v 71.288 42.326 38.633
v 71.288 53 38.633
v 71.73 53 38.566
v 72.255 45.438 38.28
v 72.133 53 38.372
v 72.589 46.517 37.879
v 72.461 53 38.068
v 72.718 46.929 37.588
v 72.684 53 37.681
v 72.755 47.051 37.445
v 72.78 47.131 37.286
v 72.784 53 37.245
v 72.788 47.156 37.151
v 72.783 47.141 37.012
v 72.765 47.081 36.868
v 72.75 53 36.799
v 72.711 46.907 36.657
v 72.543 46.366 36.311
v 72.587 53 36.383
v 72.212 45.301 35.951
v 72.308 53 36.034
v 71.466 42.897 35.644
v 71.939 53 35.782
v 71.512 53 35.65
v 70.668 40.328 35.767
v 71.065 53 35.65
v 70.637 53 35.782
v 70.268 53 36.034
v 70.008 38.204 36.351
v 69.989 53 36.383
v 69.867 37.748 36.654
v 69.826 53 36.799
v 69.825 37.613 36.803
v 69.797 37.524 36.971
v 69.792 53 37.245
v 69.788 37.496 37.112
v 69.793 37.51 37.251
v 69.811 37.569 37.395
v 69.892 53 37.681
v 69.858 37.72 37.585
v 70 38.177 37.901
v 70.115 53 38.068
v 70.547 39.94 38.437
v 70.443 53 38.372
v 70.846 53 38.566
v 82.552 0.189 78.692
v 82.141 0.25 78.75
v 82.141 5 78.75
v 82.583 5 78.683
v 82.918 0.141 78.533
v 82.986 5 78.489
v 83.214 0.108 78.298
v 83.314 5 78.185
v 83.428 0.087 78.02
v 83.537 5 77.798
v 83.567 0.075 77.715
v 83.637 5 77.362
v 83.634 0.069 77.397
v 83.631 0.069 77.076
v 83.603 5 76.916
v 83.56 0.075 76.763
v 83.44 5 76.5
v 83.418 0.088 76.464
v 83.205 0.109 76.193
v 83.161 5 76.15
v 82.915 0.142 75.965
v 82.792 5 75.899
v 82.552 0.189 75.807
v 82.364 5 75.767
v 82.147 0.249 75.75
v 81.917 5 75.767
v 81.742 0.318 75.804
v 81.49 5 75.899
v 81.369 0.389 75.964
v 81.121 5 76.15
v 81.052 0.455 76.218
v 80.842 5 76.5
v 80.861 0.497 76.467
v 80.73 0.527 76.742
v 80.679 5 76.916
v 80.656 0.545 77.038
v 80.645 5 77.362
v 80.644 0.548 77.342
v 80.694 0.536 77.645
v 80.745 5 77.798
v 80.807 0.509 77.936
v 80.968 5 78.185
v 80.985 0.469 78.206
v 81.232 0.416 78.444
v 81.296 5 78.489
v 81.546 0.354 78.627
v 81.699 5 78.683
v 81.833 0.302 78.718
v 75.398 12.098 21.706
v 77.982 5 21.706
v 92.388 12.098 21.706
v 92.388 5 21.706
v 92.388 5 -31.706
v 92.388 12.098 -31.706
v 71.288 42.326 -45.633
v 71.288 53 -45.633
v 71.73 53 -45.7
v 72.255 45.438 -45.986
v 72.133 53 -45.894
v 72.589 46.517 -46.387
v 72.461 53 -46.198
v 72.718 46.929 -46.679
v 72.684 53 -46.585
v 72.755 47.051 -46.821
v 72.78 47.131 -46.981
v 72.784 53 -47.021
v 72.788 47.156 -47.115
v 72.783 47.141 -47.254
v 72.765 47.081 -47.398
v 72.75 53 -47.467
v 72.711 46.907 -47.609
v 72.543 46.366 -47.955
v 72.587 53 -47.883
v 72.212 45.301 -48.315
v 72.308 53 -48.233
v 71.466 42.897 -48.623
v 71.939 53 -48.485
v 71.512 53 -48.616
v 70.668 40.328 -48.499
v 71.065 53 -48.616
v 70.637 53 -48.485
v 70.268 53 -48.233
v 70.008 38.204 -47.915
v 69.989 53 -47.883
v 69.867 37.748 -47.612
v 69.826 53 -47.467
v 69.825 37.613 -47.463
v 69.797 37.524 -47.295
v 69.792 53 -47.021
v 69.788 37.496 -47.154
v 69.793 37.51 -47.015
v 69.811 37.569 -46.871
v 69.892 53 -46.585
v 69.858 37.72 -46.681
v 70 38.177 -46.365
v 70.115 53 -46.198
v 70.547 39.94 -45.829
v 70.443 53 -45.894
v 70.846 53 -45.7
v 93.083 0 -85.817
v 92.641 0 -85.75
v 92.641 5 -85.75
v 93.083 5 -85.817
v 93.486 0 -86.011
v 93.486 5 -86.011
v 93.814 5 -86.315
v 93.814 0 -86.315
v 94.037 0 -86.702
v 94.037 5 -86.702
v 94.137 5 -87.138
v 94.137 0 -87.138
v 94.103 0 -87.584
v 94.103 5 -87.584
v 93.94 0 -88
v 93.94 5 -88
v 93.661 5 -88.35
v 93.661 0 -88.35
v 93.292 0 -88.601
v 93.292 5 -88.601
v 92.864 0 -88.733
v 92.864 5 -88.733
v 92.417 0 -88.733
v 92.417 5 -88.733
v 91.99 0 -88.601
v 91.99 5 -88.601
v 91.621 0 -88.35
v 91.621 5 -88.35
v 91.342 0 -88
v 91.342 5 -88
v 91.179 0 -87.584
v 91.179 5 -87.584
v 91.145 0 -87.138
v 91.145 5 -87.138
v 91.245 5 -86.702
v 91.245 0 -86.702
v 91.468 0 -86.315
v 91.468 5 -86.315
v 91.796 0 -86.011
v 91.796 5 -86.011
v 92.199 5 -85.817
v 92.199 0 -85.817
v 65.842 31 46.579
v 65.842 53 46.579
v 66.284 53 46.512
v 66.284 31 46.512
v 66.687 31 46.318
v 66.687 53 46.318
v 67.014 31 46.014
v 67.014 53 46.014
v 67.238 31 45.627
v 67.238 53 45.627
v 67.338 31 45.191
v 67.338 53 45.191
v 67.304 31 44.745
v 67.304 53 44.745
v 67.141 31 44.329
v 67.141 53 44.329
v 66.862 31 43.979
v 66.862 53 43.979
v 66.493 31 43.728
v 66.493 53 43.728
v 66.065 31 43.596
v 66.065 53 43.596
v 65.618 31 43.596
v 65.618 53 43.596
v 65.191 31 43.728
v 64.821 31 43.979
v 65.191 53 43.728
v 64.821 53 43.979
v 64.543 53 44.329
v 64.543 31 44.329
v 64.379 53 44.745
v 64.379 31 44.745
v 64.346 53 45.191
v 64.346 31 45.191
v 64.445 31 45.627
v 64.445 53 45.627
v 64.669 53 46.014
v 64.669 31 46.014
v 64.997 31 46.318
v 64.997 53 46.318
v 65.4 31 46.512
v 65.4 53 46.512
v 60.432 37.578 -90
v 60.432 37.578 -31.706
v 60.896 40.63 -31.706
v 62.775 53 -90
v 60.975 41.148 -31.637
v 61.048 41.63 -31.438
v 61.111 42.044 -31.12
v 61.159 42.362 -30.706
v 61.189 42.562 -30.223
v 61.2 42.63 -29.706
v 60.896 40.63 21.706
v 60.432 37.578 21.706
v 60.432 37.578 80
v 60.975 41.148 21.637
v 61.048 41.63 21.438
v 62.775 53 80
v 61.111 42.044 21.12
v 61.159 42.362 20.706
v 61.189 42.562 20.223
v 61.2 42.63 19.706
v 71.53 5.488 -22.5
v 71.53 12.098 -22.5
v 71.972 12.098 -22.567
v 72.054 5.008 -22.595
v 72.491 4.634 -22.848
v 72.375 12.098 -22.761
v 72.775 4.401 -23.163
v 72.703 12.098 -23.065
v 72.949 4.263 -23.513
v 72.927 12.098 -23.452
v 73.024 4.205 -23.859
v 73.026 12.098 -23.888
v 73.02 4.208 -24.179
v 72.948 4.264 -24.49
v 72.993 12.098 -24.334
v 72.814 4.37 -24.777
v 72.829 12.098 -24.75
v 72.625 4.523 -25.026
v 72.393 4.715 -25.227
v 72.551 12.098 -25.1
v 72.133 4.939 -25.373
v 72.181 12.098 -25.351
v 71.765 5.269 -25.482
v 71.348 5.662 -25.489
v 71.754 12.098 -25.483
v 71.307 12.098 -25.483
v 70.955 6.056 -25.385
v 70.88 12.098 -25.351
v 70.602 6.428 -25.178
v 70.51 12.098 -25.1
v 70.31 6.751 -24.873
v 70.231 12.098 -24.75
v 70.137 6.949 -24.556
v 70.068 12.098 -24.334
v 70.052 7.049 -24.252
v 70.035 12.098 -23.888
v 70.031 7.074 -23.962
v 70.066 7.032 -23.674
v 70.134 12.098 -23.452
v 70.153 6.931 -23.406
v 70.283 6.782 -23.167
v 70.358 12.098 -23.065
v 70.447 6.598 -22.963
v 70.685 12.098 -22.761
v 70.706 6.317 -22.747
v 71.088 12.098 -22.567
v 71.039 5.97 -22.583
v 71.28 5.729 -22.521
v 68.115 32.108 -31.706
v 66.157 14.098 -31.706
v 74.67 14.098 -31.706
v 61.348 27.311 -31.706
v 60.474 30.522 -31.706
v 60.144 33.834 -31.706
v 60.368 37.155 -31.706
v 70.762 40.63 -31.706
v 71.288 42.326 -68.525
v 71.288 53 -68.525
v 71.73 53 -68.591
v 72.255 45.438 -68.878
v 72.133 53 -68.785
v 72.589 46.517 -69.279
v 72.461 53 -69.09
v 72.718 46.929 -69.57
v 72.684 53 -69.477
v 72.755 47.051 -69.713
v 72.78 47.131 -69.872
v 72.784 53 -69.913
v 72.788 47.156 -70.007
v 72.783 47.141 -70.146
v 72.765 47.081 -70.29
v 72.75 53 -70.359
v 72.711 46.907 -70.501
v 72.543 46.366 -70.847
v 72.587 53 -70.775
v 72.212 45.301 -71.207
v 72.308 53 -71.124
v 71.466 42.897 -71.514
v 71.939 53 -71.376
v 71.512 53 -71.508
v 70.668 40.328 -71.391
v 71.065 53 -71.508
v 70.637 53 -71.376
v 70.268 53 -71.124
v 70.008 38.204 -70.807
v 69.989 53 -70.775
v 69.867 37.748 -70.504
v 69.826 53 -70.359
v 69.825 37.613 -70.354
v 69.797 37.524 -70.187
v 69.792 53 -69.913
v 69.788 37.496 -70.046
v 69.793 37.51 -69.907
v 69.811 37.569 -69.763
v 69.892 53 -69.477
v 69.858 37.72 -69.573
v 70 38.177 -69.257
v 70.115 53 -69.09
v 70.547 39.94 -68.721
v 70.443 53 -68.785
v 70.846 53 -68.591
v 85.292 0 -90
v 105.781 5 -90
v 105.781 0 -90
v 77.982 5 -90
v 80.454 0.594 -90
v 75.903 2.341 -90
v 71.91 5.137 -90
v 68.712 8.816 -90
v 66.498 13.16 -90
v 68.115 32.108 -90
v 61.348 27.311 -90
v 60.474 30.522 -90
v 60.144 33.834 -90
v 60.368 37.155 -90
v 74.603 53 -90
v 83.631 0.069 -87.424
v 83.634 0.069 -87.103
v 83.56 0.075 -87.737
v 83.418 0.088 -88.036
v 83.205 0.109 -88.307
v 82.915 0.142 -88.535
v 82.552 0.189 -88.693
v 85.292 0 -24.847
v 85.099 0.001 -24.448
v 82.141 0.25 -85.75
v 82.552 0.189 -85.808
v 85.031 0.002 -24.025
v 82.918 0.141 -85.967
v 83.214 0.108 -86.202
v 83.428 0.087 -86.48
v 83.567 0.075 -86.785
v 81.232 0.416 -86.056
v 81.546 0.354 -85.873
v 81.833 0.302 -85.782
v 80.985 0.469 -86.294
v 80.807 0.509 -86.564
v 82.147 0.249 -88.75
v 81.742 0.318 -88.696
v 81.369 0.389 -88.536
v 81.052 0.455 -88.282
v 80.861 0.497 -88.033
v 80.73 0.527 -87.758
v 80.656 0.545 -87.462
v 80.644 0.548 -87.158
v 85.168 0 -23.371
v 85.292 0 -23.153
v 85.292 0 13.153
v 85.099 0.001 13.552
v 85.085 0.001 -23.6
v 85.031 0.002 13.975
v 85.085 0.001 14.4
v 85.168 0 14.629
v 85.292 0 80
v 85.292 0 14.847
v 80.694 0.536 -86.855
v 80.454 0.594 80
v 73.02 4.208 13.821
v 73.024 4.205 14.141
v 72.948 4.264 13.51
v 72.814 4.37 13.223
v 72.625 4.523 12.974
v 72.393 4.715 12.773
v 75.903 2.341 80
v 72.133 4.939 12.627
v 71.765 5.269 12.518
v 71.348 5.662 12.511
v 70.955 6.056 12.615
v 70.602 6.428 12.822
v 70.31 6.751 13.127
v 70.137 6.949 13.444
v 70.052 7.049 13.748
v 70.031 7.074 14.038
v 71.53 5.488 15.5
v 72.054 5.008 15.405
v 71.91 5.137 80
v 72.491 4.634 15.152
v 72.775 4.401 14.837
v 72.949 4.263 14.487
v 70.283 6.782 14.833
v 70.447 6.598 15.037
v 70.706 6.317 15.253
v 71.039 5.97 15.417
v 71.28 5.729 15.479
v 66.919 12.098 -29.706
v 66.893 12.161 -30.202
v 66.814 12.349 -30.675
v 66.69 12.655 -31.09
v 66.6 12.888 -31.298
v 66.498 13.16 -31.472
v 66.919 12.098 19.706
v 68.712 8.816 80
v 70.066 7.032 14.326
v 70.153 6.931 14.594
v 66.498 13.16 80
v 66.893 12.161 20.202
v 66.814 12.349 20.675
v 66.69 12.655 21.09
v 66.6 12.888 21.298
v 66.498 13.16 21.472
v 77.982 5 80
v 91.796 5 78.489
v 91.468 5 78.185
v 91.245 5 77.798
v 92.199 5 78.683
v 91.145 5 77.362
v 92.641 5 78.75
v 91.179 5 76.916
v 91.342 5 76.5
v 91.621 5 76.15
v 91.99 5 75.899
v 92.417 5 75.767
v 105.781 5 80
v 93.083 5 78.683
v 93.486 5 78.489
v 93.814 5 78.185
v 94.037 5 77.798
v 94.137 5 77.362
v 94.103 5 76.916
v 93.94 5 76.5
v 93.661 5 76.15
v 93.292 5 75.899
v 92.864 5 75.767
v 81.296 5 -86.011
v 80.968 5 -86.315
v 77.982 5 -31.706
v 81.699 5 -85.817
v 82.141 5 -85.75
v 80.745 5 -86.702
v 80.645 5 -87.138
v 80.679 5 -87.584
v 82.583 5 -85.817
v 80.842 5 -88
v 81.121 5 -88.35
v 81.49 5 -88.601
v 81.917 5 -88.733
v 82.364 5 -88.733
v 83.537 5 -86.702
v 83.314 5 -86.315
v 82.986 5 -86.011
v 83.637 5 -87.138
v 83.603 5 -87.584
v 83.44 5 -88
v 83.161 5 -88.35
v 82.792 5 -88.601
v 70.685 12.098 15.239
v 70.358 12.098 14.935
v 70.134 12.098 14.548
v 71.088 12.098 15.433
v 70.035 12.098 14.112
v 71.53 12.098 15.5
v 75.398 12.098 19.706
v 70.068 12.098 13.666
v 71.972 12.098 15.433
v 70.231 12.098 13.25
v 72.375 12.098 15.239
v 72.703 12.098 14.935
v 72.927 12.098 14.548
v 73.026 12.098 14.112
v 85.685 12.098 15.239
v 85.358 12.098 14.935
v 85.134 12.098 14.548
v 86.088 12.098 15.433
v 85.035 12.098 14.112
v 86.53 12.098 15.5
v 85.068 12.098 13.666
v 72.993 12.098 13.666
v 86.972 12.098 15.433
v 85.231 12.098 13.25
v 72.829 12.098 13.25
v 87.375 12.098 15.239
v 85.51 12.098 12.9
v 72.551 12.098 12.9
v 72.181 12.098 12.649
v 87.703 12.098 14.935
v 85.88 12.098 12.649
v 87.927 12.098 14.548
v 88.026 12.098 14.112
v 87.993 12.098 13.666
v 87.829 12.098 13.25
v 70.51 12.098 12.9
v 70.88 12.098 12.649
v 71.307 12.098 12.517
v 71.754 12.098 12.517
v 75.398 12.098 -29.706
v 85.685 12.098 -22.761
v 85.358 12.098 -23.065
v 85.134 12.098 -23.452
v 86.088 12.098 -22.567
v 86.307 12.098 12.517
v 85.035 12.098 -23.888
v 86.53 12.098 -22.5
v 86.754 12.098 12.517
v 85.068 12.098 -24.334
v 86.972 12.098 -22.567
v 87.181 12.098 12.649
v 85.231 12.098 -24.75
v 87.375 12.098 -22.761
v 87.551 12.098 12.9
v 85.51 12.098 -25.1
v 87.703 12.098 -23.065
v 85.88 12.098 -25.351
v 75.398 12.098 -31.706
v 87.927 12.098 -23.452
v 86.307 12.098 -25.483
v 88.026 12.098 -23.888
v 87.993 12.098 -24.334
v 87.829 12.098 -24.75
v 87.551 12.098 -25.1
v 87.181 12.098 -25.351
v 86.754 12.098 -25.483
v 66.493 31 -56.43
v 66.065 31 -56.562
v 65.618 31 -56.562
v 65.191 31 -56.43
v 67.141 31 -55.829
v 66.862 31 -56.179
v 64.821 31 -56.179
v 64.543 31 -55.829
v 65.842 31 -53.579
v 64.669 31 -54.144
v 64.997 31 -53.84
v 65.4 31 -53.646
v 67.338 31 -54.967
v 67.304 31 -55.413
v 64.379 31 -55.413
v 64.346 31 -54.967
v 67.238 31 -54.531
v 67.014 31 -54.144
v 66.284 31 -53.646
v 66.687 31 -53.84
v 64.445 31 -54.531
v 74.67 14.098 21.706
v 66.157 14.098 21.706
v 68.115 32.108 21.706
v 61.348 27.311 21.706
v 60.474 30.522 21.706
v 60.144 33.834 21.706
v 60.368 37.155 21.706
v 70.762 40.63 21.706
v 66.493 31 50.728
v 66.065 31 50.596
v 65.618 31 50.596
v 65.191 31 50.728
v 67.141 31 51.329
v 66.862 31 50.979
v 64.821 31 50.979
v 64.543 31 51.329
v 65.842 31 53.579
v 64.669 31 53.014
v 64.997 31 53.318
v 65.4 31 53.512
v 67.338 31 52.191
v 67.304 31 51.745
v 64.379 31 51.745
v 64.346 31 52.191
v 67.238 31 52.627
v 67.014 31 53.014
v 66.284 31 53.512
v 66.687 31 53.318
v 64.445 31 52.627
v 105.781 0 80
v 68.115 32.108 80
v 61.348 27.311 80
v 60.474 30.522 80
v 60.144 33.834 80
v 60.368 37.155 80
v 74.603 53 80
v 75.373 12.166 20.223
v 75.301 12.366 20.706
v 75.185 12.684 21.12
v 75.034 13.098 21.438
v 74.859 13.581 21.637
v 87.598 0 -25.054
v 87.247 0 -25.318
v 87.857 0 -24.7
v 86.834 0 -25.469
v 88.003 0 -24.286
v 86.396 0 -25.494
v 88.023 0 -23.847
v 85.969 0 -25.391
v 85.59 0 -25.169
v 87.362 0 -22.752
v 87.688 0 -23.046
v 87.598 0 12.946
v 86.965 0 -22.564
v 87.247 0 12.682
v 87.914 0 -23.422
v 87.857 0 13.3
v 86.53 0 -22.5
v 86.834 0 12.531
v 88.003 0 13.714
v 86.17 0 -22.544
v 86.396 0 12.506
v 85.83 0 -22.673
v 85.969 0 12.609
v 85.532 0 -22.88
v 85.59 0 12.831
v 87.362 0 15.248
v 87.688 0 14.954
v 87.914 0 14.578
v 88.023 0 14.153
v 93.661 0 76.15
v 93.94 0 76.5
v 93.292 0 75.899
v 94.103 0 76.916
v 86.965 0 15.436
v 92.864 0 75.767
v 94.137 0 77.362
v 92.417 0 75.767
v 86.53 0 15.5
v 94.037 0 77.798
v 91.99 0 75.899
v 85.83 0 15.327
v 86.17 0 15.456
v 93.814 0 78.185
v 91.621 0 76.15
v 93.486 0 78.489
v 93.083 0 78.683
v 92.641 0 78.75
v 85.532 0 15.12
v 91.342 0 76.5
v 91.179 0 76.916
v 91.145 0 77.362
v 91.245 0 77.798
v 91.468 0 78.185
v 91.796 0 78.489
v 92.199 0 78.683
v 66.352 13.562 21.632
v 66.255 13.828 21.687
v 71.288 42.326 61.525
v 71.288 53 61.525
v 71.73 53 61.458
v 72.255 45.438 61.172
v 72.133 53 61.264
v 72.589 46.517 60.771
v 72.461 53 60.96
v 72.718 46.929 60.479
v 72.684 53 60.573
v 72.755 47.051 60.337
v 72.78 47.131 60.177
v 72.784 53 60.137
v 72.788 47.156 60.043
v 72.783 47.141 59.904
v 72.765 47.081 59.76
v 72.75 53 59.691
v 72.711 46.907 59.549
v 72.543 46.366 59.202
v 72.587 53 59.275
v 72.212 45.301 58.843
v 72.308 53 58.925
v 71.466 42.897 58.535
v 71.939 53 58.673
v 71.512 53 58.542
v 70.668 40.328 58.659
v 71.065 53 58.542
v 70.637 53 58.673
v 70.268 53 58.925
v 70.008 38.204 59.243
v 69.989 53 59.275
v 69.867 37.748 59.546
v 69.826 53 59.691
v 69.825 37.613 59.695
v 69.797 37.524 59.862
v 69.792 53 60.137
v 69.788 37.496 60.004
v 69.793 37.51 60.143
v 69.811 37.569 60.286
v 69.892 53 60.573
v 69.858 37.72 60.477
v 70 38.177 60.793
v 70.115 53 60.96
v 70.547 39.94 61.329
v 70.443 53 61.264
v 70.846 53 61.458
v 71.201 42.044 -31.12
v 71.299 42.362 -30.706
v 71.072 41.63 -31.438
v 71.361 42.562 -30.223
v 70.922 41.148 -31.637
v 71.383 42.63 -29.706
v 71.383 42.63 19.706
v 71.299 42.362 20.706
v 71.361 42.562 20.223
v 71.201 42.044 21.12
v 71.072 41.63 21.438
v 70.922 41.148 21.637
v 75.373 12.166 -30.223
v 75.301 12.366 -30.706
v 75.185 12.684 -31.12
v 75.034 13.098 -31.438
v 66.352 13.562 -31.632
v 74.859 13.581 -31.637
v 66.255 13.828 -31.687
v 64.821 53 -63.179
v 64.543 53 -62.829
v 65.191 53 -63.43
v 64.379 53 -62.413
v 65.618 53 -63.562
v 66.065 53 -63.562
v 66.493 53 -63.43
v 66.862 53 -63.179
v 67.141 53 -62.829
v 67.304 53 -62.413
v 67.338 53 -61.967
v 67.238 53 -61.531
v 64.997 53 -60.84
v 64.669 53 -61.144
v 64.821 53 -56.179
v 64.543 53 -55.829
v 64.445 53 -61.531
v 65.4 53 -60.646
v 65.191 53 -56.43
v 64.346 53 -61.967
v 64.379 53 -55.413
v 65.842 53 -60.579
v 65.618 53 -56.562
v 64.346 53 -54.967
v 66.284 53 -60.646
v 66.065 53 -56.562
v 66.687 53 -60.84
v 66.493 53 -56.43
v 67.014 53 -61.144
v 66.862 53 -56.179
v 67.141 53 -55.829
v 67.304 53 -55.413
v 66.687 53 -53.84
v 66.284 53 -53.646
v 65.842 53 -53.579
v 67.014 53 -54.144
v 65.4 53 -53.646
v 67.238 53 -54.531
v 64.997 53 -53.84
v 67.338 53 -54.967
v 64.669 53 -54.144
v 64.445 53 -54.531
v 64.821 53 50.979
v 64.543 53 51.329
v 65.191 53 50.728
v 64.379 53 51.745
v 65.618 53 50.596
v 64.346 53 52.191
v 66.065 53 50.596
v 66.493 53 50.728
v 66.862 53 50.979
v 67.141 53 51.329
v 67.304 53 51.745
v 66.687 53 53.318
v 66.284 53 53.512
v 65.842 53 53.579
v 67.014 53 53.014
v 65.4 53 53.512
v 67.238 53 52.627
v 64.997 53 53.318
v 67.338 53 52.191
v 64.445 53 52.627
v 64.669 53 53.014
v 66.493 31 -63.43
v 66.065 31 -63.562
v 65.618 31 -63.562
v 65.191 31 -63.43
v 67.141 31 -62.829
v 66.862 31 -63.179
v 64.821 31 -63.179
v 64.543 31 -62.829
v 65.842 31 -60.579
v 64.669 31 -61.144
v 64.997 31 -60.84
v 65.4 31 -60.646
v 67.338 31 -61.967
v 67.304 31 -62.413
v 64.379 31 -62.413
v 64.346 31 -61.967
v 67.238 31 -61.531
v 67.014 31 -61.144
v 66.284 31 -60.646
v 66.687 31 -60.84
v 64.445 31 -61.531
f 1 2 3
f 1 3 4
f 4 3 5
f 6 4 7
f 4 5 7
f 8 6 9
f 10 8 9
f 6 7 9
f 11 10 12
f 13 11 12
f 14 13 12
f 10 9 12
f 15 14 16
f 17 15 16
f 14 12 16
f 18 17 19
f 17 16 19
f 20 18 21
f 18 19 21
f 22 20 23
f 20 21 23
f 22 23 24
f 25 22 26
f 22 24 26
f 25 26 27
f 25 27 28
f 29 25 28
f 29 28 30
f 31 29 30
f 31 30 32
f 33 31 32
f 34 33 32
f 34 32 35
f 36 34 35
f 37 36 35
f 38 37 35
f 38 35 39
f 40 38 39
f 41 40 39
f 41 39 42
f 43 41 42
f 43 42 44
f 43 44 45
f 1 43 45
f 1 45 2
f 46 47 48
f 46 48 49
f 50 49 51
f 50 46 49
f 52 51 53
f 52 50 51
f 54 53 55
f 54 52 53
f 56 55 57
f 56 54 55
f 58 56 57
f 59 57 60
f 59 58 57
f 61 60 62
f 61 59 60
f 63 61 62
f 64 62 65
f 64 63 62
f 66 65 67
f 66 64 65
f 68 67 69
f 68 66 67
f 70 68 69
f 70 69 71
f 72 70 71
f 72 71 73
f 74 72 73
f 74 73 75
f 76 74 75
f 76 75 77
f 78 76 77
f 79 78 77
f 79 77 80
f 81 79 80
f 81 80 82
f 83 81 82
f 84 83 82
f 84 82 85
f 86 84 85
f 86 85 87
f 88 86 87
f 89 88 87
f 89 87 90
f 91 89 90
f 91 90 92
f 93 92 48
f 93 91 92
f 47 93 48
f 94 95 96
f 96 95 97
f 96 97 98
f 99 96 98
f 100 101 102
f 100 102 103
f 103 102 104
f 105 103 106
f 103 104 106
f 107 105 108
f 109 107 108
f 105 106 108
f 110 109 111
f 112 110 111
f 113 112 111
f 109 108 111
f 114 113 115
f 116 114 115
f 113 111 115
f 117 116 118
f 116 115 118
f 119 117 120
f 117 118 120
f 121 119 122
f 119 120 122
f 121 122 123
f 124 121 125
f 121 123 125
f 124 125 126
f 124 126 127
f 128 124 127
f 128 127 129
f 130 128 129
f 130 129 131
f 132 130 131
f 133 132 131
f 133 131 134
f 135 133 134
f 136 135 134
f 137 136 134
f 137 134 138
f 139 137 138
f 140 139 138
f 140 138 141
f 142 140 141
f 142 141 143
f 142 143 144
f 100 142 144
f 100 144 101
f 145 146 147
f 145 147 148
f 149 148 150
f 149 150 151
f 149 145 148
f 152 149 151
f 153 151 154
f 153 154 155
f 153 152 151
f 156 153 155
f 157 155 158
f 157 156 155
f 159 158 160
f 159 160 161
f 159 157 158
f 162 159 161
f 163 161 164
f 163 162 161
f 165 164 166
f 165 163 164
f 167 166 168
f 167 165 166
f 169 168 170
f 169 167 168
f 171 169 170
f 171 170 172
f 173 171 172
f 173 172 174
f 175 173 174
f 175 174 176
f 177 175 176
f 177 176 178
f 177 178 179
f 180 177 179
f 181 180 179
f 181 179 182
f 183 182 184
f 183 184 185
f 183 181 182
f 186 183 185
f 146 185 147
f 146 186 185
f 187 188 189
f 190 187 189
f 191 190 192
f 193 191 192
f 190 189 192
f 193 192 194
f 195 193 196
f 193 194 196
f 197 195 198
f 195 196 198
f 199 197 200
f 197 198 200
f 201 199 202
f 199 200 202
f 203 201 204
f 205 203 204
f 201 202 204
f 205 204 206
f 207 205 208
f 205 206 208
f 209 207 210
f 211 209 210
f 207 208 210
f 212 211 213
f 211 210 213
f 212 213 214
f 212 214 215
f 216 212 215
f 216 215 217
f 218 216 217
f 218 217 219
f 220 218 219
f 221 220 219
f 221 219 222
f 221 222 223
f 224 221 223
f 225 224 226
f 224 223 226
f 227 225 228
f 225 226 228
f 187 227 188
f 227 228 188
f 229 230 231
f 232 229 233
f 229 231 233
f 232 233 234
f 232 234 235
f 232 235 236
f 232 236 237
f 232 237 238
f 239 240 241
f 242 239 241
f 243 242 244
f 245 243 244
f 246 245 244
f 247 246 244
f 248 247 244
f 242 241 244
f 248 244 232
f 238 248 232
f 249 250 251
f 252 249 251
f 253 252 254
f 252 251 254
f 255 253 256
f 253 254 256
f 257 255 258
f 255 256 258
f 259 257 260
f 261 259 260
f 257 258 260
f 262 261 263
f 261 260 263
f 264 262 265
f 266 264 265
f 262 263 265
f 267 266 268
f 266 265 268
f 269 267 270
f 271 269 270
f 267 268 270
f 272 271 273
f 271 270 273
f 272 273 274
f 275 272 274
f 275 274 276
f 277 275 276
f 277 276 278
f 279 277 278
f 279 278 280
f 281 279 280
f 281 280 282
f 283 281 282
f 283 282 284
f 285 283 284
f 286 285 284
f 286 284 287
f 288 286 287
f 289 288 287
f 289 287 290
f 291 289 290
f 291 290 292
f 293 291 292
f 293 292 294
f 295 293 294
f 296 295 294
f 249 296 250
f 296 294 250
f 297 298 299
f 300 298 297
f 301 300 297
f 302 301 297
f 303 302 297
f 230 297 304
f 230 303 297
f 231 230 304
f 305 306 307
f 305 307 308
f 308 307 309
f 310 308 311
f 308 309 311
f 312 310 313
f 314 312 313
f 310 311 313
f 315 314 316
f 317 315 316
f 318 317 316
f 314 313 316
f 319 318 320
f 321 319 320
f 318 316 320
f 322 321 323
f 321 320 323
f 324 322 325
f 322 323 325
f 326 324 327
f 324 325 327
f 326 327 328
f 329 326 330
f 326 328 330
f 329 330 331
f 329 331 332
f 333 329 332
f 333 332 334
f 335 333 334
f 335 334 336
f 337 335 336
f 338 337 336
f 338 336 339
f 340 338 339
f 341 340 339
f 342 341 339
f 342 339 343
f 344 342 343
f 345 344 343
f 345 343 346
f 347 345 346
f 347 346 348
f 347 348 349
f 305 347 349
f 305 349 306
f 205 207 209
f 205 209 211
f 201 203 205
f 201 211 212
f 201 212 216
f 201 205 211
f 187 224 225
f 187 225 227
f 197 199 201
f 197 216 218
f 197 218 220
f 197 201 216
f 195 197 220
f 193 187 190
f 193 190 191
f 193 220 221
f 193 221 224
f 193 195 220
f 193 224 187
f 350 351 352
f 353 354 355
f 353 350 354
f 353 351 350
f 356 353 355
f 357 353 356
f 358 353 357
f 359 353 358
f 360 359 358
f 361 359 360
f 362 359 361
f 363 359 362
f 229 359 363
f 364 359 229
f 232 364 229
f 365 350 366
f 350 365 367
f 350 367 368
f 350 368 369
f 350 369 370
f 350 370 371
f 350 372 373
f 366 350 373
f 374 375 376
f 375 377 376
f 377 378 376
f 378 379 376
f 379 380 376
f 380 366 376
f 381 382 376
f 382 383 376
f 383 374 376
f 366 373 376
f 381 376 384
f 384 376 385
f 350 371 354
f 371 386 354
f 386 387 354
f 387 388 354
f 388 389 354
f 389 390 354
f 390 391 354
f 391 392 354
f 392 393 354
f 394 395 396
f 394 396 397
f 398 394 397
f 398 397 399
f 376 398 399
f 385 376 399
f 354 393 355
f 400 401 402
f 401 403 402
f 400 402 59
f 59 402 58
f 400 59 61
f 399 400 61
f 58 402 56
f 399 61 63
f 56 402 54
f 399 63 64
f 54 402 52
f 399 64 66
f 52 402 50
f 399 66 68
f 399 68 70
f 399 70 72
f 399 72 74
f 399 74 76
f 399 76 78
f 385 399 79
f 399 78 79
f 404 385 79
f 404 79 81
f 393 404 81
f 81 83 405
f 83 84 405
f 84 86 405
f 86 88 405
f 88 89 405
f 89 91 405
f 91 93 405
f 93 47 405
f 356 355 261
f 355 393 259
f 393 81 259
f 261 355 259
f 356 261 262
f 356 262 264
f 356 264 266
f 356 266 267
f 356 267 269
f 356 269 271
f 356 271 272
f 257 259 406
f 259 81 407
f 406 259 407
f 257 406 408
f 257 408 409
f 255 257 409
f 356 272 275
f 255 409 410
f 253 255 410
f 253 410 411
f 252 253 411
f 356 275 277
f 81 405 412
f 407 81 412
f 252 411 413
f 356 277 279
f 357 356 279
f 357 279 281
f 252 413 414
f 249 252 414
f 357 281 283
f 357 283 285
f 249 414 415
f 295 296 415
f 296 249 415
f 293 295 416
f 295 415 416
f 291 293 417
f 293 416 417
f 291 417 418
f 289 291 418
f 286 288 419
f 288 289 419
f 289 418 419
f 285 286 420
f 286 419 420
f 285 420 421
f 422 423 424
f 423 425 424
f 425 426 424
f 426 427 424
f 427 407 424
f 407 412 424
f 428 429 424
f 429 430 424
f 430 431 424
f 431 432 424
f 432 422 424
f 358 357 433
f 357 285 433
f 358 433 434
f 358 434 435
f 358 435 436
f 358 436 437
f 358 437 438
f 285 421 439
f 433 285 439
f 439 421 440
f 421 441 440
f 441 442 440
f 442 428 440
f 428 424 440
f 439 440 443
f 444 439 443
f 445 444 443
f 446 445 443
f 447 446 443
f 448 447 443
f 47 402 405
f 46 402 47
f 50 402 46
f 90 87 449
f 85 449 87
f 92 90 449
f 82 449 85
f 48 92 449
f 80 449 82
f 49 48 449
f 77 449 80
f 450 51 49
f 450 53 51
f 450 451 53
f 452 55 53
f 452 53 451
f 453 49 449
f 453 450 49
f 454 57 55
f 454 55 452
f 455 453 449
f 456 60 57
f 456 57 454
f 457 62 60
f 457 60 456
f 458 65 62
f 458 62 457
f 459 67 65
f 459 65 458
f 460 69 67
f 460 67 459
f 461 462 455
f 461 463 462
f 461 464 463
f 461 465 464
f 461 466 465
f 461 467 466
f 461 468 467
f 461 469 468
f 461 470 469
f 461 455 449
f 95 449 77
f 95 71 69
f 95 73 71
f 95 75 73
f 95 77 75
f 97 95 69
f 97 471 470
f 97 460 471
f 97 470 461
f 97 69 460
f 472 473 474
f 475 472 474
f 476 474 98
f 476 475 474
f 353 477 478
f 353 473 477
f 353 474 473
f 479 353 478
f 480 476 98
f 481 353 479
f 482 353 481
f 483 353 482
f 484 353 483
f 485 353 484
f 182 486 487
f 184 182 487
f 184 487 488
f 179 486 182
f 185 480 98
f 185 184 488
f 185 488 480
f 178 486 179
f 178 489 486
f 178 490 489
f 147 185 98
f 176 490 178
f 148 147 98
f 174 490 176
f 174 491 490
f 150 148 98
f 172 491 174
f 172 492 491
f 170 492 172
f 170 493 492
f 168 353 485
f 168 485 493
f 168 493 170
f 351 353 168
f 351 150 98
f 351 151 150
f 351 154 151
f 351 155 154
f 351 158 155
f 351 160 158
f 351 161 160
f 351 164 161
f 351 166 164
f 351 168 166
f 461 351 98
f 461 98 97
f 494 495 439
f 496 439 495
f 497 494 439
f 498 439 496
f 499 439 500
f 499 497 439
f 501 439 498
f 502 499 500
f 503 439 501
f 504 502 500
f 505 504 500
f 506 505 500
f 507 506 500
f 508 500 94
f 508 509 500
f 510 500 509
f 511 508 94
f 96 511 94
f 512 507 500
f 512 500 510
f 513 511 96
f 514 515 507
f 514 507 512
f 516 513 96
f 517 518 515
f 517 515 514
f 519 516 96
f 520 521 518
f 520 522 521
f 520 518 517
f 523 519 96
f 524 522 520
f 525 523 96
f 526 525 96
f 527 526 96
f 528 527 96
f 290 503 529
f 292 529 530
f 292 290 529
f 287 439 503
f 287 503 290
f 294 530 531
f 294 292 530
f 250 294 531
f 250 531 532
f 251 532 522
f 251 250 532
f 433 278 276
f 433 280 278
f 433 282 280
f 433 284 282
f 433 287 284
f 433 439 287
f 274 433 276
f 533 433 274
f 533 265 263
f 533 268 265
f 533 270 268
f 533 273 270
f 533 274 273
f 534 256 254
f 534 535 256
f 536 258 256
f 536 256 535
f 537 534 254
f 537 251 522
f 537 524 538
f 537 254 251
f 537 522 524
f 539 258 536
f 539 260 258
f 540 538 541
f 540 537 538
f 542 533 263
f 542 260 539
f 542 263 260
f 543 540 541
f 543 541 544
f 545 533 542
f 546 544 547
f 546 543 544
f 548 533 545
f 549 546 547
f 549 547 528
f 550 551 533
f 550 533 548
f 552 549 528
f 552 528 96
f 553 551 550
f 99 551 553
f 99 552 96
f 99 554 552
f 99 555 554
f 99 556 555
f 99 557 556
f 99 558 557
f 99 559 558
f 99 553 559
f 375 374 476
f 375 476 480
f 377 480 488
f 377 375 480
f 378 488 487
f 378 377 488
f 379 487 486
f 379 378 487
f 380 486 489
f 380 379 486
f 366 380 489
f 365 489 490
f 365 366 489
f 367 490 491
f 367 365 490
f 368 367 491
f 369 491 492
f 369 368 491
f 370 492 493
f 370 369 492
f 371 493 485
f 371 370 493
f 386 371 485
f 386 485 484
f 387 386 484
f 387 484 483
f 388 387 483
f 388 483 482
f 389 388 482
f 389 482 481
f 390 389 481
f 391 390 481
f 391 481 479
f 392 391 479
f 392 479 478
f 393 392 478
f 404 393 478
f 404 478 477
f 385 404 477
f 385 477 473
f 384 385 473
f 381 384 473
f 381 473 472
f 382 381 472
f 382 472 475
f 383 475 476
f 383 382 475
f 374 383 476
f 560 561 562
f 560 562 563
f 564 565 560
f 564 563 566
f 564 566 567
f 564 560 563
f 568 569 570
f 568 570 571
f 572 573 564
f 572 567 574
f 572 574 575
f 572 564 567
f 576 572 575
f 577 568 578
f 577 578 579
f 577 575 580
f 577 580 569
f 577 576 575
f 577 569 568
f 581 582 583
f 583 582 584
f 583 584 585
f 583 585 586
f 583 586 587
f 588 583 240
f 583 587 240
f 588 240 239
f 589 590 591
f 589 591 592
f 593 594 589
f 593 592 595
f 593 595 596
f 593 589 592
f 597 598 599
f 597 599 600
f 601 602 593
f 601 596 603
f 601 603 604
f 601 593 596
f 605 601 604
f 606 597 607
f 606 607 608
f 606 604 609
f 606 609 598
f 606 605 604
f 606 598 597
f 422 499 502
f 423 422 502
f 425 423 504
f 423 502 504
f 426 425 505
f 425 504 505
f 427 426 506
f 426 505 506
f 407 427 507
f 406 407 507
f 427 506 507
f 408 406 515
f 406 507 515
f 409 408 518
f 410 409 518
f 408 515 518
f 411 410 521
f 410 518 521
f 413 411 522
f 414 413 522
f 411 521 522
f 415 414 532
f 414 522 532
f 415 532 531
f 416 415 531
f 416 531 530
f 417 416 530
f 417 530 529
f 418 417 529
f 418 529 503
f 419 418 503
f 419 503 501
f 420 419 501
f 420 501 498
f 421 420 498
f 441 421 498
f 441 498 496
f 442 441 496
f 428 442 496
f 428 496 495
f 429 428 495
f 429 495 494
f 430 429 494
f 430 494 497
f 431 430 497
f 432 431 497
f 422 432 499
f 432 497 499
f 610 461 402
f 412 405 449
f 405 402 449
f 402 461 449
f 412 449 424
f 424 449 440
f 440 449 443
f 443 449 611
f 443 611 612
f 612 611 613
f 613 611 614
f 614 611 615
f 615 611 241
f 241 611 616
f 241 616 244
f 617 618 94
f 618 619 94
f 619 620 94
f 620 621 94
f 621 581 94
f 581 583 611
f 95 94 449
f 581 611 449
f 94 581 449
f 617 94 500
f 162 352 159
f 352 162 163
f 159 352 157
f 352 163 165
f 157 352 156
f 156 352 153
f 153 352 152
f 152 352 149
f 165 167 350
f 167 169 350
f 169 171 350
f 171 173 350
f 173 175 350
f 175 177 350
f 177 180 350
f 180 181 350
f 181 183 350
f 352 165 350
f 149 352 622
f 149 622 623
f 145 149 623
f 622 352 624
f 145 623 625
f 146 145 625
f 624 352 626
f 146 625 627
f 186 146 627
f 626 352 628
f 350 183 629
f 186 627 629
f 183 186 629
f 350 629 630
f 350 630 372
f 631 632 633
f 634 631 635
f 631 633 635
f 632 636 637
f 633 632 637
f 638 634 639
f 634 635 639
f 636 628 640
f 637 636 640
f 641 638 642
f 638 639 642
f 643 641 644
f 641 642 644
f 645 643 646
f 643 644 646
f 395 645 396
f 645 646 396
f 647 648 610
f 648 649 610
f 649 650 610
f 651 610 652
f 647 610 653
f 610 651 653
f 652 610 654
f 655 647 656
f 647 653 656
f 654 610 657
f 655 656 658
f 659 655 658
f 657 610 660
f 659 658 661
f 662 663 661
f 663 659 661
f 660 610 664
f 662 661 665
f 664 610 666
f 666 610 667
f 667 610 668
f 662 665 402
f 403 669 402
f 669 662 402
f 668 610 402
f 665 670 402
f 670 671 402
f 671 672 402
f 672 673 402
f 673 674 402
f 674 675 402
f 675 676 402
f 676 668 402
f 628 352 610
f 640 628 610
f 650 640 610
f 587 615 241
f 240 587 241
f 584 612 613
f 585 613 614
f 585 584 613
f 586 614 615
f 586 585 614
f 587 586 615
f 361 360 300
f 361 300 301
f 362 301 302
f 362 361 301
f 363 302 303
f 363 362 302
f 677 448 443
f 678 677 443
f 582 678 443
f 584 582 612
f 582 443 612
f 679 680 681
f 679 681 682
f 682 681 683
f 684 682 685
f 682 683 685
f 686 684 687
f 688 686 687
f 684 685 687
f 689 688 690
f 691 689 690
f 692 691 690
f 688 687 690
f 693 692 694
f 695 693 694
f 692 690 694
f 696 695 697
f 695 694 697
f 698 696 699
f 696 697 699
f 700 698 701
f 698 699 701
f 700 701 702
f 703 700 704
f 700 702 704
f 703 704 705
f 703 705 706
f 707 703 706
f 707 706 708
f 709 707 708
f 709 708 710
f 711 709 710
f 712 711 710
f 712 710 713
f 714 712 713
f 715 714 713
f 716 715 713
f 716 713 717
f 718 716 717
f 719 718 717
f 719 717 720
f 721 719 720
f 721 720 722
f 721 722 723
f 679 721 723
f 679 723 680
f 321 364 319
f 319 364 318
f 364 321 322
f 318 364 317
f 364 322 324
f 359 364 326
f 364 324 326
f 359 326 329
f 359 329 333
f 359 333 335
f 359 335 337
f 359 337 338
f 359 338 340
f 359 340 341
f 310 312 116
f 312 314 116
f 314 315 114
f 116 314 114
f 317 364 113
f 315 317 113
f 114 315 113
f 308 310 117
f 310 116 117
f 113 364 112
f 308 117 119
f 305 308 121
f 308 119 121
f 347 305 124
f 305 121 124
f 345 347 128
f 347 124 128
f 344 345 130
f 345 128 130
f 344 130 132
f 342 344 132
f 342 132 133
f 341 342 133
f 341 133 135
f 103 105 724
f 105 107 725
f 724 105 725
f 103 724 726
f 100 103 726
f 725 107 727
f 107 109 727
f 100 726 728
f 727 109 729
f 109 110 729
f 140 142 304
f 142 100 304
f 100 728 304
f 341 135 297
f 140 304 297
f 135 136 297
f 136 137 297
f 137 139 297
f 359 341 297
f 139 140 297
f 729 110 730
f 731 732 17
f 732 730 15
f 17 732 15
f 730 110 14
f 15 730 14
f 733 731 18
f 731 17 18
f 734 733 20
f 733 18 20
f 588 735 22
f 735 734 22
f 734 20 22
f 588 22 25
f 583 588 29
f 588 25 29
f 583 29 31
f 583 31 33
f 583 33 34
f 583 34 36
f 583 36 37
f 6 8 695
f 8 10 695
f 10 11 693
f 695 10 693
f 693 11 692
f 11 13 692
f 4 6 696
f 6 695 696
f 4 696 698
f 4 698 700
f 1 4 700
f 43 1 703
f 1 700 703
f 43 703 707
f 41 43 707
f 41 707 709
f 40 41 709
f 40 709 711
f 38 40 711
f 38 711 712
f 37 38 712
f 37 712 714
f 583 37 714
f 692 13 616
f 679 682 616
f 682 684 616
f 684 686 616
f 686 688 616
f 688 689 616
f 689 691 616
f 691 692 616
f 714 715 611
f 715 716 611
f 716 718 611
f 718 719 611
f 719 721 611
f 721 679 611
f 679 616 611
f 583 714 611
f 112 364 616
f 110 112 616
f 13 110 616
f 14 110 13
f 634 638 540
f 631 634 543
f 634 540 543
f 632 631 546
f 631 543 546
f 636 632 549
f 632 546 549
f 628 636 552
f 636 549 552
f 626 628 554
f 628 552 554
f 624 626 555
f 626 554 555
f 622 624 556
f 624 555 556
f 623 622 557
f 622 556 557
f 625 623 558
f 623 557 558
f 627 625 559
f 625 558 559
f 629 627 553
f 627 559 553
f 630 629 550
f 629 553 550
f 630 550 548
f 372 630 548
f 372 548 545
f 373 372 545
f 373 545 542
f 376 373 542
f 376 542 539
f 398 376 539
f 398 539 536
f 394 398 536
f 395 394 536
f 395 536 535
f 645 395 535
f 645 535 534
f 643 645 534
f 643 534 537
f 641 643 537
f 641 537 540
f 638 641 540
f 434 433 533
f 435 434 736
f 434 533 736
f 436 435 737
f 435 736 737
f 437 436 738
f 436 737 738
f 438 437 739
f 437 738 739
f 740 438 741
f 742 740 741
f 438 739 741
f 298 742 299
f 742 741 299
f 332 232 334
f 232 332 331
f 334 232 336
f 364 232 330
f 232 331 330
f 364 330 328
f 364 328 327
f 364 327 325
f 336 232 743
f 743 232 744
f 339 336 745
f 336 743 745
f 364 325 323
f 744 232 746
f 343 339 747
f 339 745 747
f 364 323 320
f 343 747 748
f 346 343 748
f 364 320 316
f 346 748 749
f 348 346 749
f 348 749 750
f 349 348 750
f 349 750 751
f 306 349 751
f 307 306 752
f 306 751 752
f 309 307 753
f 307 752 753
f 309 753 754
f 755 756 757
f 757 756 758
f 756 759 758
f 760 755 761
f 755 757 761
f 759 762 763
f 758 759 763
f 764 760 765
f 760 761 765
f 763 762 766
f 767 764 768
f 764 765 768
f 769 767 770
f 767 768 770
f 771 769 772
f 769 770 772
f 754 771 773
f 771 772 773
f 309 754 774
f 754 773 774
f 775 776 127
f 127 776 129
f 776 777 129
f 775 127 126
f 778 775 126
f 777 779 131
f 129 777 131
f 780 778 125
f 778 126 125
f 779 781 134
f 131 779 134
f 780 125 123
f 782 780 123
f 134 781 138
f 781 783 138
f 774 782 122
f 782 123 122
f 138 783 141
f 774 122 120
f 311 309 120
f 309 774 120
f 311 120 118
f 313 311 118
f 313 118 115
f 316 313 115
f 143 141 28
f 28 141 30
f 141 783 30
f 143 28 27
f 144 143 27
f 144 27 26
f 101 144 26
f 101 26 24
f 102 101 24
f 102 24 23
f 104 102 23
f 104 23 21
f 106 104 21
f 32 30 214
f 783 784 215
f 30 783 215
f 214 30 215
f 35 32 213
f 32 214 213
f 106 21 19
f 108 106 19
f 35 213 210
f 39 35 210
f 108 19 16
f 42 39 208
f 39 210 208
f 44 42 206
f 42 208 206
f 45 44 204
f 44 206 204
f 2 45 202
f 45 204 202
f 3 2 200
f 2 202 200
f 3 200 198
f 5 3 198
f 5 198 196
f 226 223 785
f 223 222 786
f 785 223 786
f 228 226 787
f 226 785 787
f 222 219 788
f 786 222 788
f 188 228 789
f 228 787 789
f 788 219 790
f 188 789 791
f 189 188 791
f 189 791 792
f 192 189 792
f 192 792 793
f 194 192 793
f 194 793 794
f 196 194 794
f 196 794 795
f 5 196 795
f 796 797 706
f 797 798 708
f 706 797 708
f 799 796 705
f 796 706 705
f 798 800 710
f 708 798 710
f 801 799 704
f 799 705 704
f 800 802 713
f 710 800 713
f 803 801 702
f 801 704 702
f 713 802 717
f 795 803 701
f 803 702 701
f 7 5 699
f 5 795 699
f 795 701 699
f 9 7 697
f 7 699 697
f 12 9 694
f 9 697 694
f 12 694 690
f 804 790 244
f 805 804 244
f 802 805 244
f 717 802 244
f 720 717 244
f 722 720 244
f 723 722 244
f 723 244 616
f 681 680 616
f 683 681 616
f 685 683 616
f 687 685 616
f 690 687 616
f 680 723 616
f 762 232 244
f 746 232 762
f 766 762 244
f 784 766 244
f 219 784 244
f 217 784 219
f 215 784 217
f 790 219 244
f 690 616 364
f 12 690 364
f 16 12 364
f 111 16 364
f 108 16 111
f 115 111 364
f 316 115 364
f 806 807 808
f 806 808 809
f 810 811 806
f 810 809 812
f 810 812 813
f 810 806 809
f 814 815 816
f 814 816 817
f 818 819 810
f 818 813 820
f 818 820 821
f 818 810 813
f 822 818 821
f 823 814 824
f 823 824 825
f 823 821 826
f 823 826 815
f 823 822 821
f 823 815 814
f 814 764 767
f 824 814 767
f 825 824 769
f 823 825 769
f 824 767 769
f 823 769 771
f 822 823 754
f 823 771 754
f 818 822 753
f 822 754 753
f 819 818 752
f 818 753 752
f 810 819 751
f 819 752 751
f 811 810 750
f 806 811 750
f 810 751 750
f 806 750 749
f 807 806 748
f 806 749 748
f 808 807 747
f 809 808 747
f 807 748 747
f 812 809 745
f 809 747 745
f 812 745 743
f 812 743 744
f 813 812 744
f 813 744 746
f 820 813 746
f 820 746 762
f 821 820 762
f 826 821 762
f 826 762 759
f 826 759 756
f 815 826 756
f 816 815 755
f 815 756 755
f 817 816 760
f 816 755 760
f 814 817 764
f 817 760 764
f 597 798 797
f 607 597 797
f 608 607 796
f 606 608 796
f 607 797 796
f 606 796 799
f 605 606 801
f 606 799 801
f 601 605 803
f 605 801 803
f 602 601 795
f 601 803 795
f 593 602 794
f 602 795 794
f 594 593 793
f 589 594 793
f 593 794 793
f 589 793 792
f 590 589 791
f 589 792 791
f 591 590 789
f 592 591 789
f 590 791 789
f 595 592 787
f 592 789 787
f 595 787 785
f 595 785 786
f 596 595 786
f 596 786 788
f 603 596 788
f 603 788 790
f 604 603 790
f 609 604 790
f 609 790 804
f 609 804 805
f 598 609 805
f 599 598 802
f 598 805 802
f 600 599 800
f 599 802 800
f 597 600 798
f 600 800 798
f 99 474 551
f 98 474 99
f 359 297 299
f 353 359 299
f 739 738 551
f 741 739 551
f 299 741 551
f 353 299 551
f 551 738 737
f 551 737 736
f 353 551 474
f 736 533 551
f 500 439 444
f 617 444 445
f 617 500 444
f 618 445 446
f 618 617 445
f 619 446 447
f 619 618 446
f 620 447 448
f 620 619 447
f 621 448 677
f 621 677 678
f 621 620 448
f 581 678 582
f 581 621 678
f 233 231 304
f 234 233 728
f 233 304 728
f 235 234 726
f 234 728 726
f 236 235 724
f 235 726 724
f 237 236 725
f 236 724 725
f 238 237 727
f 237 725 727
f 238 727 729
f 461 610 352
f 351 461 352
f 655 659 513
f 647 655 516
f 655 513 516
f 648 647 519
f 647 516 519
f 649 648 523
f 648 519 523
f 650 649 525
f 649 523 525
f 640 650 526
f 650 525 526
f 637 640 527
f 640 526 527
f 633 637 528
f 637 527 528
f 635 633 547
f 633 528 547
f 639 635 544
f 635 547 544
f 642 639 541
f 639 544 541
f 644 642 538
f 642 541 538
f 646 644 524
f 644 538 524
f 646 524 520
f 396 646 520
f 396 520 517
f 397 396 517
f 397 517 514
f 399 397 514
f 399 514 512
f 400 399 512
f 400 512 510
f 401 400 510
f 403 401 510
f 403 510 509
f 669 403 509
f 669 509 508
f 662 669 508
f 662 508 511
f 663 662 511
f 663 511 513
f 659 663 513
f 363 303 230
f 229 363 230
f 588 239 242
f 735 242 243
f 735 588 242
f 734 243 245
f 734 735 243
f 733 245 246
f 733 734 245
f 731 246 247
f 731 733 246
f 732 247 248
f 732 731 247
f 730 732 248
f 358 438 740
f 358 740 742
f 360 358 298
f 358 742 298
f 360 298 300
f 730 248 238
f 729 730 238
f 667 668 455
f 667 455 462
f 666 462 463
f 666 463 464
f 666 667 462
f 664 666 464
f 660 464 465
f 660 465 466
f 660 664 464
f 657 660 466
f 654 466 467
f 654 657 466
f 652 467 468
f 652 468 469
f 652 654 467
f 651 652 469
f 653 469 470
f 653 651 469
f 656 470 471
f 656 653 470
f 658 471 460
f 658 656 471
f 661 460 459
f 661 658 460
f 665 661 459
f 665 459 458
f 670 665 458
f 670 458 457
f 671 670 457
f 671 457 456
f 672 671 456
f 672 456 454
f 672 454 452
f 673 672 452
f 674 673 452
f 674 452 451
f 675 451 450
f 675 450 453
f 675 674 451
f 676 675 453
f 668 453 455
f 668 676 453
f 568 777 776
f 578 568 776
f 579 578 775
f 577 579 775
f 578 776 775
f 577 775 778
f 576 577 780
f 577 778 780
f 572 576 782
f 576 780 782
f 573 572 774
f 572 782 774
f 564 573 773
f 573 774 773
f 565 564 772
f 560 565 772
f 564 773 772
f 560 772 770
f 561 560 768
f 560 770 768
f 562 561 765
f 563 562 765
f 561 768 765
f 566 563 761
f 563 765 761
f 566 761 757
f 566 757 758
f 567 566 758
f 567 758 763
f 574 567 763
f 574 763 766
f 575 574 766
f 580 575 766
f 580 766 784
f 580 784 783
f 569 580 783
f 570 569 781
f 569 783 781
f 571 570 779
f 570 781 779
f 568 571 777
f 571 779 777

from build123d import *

# Parameters (mm, degrees)
SKETCH_1_W          = 27.799055089
SKETCH_1_H          = 170
SKETCH_1_R          = 1.5
EXTRUDE_1_DEPTH     = 5
EXTRUDE_2_DEPTH     = 170
FILLET_1_R          = 20
FILLET_2_R          = 20
SKETCH_3_R          = 1.5
CUT_EXTRUDE_1_DEPTH = 22
SKETCH_5_W          = 53.411136204
SKETCH_5_H          = 30.531921538
CUT_EXTRUDE_2_DEPTH = 138
SKETCH_6_W          = 16.9901426
SKETCH_6_H          = 53.411136204
EXTRUDE_3_DEPTH     = 7.098148729
FILLET_3_R          = 2
SKETCH_7_R          = 1.5
CUT_EXTRUDE_3_DEPTH = 20


with BuildPart() as part:
    # 草图1 → 凸台-拉伸1 (new body)
    with BuildSketch(Plane(origin=(0, 0, 0), x_dir=(1, 0, 0), z_dir=(0, 1, 0))):
        with Locations((91.881203353, 5)):
            Rectangle(SKETCH_1_W, SKETCH_1_H)
        with Locations(Location((82.140918425, 87.25, 0), (0, 0, 270))):
            Circle(SKETCH_1_R, mode=Mode.SUBTRACT)
        with Locations(Location((92.640918425, 87.25, 0), (0, 0, 270))):
            Circle(SKETCH_1_R, mode=Mode.SUBTRACT)
        with Locations(Location((82.140918425, -77.25, 0), (0, 0, 270))):
            Circle(SKETCH_1_R, mode=Mode.SUBTRACT)
        with Locations(Location((92.640918425, -77.25, 0), (0, 0, 270))):
            Circle(SKETCH_1_R, mode=Mode.SUBTRACT)
    extrude(amount=EXTRUDE_1_DEPTH)

    # 草图2 → 凸台-拉伸2 (add)
    with BuildSketch(Plane.XY.offset(80)):
        Polygon((70.154089187, 3.11568229), (59.601778844, 32.107916678), (60.432470808, 37.577633674), (62.77468262, 53), (74.6026601, 53), (68.115201024, 32.107916678), (77.981675808, 5), (77.981675808, 0), (71.288104799, 0), align=None)
    extrude(amount=-EXTRUDE_2_DEPTH)

    # 圆角1
    fillet_1_edges = [part.edges().sort_by_distance(p)[0] for p in [
        (59.601778844, 32.107916678, -5),
    ]]
    fillet(fillet_1_edges, radius=FILLET_1_R)

    # 圆角2
    # the kernel refuses this fillet: 20 mm, written as the material it takes off along each edge
    with BuildSketch(Plane(origin=(71.288104799, 0, 115.01037691), x_dir=(-0.34202014332567304, 0.9396926207859069, 0), z_dir=(0, 0, -1))) as fillet_2_piece_1:
        with BuildLine():
            CenterArc((FILLET_2_R * 0.70020753821, FILLET_2_R), FILLET_2_R, 200, 70)
            Line((-FILLET_2_R * 0.239485082576, FILLET_2_R * 0.657979856674), (0, 0))
            Line((0, 0), (FILLET_2_R * 0.70020753821, 0))
        make_face()
    extrude(amount=240.020753821, mode=Mode.SUBTRACT)

    # 草图3 → 切除-拉伸1 (cut)
    with BuildSketch(Plane(origin=(0, 53, 0), x_dir=(1, 0, 0), z_dir=(0, 1, 0))):
        with Locations(Location((71.288104799, 70.02483454, 0), (0, 0, 270))):
            Circle(SKETCH_3_R)
        with Locations(Location((65.841750728, 62.078973455, 0), (0, 0, 270))):
            Circle(SKETCH_3_R)
        with Locations(Location((65.841750728, 55.078973455, 0), (0, 0, 270))):
            Circle(SKETCH_3_R)
        with Locations(Location((71.288104799, 47.133112371, 0), (0, 0, 270))):
            Circle(SKETCH_3_R)
        with Locations(Location((71.288104799, -37.133112371, 0), (0, 0, 270))):
            Circle(SKETCH_3_R)
        with Locations(Location((65.841750728, -45.078973455, 0), (0, 0, 270))):
            Circle(SKETCH_3_R)
        with Locations(Location((65.841750728, -52.078973455, 0), (0, 0, 270))):
            Circle(SKETCH_3_R)
        with Locations(Location((71.288104799, -60.02483454, 0), (0, 0, 270))):
            Circle(SKETCH_3_R)
    extrude(amount=-CUT_EXTRUDE_1_DEPTH, mode=Mode.SUBTRACT)

    # 草图5 → 切除-拉伸2 (cut)
    with BuildSketch(Plane(origin=(0, 0, 0), x_dir=(0, 0, -1), z_dir=(1, 0, 0))):
        with Locations((5, 27.364109498)):
            Rectangle(SKETCH_5_W, SKETCH_5_H)
    extrude(amount=CUT_EXTRUDE_2_DEPTH, mode=Mode.SUBTRACT)

    # 草图6 → 凸台-拉伸3 (add)
    with BuildSketch(Plane(origin=(0, 5, 0), x_dir=(1, 0, 0), z_dir=(0, 1, 0))):
        with Locations((83.893232252, 5)):
            Rectangle(SKETCH_6_W, SKETCH_6_H)
    extrude(amount=EXTRUDE_3_DEPTH)

    # 圆角3
    fillet_3_edges = [part.edges().sort_by_distance(p)[0] for p in [
        (71.158795105, 12.098148729, -31.705568102),
        (71.158795105, 12.098148729, 21.705568102),
        (66.291177476, 42.630070267, 21.705568102),
        (66.291177476, 42.630070267, -31.705568102),
    ]]
    fillet(fillet_3_edges, radius=FILLET_3_R)

    # 草图7 → 切除-拉伸3 (cut)
    with BuildSketch(Plane(origin=(0, 12.098148729, 0), x_dir=(1, 0, 0), z_dir=(0, 1, 0))):
        with Locations(Location((71.530354556, -14, 0), (0, 0, 270))):
            Circle(SKETCH_7_R)
        with Locations(Location((71.530354556, 24, 0), (0, 0, 270))):
            Circle(SKETCH_7_R)
        with Locations(Location((86.530354556, 24, 0), (0, 0, 270))):
            Circle(SKETCH_7_R)
        with Locations(Location((86.530354556, -14, 0), (0, 0, 270))):
            Circle(SKETCH_7_R)
    extrude(amount=-CUT_EXTRUDE_3_DEPTH, mode=Mode.SUBTRACT)


solid = part.part
